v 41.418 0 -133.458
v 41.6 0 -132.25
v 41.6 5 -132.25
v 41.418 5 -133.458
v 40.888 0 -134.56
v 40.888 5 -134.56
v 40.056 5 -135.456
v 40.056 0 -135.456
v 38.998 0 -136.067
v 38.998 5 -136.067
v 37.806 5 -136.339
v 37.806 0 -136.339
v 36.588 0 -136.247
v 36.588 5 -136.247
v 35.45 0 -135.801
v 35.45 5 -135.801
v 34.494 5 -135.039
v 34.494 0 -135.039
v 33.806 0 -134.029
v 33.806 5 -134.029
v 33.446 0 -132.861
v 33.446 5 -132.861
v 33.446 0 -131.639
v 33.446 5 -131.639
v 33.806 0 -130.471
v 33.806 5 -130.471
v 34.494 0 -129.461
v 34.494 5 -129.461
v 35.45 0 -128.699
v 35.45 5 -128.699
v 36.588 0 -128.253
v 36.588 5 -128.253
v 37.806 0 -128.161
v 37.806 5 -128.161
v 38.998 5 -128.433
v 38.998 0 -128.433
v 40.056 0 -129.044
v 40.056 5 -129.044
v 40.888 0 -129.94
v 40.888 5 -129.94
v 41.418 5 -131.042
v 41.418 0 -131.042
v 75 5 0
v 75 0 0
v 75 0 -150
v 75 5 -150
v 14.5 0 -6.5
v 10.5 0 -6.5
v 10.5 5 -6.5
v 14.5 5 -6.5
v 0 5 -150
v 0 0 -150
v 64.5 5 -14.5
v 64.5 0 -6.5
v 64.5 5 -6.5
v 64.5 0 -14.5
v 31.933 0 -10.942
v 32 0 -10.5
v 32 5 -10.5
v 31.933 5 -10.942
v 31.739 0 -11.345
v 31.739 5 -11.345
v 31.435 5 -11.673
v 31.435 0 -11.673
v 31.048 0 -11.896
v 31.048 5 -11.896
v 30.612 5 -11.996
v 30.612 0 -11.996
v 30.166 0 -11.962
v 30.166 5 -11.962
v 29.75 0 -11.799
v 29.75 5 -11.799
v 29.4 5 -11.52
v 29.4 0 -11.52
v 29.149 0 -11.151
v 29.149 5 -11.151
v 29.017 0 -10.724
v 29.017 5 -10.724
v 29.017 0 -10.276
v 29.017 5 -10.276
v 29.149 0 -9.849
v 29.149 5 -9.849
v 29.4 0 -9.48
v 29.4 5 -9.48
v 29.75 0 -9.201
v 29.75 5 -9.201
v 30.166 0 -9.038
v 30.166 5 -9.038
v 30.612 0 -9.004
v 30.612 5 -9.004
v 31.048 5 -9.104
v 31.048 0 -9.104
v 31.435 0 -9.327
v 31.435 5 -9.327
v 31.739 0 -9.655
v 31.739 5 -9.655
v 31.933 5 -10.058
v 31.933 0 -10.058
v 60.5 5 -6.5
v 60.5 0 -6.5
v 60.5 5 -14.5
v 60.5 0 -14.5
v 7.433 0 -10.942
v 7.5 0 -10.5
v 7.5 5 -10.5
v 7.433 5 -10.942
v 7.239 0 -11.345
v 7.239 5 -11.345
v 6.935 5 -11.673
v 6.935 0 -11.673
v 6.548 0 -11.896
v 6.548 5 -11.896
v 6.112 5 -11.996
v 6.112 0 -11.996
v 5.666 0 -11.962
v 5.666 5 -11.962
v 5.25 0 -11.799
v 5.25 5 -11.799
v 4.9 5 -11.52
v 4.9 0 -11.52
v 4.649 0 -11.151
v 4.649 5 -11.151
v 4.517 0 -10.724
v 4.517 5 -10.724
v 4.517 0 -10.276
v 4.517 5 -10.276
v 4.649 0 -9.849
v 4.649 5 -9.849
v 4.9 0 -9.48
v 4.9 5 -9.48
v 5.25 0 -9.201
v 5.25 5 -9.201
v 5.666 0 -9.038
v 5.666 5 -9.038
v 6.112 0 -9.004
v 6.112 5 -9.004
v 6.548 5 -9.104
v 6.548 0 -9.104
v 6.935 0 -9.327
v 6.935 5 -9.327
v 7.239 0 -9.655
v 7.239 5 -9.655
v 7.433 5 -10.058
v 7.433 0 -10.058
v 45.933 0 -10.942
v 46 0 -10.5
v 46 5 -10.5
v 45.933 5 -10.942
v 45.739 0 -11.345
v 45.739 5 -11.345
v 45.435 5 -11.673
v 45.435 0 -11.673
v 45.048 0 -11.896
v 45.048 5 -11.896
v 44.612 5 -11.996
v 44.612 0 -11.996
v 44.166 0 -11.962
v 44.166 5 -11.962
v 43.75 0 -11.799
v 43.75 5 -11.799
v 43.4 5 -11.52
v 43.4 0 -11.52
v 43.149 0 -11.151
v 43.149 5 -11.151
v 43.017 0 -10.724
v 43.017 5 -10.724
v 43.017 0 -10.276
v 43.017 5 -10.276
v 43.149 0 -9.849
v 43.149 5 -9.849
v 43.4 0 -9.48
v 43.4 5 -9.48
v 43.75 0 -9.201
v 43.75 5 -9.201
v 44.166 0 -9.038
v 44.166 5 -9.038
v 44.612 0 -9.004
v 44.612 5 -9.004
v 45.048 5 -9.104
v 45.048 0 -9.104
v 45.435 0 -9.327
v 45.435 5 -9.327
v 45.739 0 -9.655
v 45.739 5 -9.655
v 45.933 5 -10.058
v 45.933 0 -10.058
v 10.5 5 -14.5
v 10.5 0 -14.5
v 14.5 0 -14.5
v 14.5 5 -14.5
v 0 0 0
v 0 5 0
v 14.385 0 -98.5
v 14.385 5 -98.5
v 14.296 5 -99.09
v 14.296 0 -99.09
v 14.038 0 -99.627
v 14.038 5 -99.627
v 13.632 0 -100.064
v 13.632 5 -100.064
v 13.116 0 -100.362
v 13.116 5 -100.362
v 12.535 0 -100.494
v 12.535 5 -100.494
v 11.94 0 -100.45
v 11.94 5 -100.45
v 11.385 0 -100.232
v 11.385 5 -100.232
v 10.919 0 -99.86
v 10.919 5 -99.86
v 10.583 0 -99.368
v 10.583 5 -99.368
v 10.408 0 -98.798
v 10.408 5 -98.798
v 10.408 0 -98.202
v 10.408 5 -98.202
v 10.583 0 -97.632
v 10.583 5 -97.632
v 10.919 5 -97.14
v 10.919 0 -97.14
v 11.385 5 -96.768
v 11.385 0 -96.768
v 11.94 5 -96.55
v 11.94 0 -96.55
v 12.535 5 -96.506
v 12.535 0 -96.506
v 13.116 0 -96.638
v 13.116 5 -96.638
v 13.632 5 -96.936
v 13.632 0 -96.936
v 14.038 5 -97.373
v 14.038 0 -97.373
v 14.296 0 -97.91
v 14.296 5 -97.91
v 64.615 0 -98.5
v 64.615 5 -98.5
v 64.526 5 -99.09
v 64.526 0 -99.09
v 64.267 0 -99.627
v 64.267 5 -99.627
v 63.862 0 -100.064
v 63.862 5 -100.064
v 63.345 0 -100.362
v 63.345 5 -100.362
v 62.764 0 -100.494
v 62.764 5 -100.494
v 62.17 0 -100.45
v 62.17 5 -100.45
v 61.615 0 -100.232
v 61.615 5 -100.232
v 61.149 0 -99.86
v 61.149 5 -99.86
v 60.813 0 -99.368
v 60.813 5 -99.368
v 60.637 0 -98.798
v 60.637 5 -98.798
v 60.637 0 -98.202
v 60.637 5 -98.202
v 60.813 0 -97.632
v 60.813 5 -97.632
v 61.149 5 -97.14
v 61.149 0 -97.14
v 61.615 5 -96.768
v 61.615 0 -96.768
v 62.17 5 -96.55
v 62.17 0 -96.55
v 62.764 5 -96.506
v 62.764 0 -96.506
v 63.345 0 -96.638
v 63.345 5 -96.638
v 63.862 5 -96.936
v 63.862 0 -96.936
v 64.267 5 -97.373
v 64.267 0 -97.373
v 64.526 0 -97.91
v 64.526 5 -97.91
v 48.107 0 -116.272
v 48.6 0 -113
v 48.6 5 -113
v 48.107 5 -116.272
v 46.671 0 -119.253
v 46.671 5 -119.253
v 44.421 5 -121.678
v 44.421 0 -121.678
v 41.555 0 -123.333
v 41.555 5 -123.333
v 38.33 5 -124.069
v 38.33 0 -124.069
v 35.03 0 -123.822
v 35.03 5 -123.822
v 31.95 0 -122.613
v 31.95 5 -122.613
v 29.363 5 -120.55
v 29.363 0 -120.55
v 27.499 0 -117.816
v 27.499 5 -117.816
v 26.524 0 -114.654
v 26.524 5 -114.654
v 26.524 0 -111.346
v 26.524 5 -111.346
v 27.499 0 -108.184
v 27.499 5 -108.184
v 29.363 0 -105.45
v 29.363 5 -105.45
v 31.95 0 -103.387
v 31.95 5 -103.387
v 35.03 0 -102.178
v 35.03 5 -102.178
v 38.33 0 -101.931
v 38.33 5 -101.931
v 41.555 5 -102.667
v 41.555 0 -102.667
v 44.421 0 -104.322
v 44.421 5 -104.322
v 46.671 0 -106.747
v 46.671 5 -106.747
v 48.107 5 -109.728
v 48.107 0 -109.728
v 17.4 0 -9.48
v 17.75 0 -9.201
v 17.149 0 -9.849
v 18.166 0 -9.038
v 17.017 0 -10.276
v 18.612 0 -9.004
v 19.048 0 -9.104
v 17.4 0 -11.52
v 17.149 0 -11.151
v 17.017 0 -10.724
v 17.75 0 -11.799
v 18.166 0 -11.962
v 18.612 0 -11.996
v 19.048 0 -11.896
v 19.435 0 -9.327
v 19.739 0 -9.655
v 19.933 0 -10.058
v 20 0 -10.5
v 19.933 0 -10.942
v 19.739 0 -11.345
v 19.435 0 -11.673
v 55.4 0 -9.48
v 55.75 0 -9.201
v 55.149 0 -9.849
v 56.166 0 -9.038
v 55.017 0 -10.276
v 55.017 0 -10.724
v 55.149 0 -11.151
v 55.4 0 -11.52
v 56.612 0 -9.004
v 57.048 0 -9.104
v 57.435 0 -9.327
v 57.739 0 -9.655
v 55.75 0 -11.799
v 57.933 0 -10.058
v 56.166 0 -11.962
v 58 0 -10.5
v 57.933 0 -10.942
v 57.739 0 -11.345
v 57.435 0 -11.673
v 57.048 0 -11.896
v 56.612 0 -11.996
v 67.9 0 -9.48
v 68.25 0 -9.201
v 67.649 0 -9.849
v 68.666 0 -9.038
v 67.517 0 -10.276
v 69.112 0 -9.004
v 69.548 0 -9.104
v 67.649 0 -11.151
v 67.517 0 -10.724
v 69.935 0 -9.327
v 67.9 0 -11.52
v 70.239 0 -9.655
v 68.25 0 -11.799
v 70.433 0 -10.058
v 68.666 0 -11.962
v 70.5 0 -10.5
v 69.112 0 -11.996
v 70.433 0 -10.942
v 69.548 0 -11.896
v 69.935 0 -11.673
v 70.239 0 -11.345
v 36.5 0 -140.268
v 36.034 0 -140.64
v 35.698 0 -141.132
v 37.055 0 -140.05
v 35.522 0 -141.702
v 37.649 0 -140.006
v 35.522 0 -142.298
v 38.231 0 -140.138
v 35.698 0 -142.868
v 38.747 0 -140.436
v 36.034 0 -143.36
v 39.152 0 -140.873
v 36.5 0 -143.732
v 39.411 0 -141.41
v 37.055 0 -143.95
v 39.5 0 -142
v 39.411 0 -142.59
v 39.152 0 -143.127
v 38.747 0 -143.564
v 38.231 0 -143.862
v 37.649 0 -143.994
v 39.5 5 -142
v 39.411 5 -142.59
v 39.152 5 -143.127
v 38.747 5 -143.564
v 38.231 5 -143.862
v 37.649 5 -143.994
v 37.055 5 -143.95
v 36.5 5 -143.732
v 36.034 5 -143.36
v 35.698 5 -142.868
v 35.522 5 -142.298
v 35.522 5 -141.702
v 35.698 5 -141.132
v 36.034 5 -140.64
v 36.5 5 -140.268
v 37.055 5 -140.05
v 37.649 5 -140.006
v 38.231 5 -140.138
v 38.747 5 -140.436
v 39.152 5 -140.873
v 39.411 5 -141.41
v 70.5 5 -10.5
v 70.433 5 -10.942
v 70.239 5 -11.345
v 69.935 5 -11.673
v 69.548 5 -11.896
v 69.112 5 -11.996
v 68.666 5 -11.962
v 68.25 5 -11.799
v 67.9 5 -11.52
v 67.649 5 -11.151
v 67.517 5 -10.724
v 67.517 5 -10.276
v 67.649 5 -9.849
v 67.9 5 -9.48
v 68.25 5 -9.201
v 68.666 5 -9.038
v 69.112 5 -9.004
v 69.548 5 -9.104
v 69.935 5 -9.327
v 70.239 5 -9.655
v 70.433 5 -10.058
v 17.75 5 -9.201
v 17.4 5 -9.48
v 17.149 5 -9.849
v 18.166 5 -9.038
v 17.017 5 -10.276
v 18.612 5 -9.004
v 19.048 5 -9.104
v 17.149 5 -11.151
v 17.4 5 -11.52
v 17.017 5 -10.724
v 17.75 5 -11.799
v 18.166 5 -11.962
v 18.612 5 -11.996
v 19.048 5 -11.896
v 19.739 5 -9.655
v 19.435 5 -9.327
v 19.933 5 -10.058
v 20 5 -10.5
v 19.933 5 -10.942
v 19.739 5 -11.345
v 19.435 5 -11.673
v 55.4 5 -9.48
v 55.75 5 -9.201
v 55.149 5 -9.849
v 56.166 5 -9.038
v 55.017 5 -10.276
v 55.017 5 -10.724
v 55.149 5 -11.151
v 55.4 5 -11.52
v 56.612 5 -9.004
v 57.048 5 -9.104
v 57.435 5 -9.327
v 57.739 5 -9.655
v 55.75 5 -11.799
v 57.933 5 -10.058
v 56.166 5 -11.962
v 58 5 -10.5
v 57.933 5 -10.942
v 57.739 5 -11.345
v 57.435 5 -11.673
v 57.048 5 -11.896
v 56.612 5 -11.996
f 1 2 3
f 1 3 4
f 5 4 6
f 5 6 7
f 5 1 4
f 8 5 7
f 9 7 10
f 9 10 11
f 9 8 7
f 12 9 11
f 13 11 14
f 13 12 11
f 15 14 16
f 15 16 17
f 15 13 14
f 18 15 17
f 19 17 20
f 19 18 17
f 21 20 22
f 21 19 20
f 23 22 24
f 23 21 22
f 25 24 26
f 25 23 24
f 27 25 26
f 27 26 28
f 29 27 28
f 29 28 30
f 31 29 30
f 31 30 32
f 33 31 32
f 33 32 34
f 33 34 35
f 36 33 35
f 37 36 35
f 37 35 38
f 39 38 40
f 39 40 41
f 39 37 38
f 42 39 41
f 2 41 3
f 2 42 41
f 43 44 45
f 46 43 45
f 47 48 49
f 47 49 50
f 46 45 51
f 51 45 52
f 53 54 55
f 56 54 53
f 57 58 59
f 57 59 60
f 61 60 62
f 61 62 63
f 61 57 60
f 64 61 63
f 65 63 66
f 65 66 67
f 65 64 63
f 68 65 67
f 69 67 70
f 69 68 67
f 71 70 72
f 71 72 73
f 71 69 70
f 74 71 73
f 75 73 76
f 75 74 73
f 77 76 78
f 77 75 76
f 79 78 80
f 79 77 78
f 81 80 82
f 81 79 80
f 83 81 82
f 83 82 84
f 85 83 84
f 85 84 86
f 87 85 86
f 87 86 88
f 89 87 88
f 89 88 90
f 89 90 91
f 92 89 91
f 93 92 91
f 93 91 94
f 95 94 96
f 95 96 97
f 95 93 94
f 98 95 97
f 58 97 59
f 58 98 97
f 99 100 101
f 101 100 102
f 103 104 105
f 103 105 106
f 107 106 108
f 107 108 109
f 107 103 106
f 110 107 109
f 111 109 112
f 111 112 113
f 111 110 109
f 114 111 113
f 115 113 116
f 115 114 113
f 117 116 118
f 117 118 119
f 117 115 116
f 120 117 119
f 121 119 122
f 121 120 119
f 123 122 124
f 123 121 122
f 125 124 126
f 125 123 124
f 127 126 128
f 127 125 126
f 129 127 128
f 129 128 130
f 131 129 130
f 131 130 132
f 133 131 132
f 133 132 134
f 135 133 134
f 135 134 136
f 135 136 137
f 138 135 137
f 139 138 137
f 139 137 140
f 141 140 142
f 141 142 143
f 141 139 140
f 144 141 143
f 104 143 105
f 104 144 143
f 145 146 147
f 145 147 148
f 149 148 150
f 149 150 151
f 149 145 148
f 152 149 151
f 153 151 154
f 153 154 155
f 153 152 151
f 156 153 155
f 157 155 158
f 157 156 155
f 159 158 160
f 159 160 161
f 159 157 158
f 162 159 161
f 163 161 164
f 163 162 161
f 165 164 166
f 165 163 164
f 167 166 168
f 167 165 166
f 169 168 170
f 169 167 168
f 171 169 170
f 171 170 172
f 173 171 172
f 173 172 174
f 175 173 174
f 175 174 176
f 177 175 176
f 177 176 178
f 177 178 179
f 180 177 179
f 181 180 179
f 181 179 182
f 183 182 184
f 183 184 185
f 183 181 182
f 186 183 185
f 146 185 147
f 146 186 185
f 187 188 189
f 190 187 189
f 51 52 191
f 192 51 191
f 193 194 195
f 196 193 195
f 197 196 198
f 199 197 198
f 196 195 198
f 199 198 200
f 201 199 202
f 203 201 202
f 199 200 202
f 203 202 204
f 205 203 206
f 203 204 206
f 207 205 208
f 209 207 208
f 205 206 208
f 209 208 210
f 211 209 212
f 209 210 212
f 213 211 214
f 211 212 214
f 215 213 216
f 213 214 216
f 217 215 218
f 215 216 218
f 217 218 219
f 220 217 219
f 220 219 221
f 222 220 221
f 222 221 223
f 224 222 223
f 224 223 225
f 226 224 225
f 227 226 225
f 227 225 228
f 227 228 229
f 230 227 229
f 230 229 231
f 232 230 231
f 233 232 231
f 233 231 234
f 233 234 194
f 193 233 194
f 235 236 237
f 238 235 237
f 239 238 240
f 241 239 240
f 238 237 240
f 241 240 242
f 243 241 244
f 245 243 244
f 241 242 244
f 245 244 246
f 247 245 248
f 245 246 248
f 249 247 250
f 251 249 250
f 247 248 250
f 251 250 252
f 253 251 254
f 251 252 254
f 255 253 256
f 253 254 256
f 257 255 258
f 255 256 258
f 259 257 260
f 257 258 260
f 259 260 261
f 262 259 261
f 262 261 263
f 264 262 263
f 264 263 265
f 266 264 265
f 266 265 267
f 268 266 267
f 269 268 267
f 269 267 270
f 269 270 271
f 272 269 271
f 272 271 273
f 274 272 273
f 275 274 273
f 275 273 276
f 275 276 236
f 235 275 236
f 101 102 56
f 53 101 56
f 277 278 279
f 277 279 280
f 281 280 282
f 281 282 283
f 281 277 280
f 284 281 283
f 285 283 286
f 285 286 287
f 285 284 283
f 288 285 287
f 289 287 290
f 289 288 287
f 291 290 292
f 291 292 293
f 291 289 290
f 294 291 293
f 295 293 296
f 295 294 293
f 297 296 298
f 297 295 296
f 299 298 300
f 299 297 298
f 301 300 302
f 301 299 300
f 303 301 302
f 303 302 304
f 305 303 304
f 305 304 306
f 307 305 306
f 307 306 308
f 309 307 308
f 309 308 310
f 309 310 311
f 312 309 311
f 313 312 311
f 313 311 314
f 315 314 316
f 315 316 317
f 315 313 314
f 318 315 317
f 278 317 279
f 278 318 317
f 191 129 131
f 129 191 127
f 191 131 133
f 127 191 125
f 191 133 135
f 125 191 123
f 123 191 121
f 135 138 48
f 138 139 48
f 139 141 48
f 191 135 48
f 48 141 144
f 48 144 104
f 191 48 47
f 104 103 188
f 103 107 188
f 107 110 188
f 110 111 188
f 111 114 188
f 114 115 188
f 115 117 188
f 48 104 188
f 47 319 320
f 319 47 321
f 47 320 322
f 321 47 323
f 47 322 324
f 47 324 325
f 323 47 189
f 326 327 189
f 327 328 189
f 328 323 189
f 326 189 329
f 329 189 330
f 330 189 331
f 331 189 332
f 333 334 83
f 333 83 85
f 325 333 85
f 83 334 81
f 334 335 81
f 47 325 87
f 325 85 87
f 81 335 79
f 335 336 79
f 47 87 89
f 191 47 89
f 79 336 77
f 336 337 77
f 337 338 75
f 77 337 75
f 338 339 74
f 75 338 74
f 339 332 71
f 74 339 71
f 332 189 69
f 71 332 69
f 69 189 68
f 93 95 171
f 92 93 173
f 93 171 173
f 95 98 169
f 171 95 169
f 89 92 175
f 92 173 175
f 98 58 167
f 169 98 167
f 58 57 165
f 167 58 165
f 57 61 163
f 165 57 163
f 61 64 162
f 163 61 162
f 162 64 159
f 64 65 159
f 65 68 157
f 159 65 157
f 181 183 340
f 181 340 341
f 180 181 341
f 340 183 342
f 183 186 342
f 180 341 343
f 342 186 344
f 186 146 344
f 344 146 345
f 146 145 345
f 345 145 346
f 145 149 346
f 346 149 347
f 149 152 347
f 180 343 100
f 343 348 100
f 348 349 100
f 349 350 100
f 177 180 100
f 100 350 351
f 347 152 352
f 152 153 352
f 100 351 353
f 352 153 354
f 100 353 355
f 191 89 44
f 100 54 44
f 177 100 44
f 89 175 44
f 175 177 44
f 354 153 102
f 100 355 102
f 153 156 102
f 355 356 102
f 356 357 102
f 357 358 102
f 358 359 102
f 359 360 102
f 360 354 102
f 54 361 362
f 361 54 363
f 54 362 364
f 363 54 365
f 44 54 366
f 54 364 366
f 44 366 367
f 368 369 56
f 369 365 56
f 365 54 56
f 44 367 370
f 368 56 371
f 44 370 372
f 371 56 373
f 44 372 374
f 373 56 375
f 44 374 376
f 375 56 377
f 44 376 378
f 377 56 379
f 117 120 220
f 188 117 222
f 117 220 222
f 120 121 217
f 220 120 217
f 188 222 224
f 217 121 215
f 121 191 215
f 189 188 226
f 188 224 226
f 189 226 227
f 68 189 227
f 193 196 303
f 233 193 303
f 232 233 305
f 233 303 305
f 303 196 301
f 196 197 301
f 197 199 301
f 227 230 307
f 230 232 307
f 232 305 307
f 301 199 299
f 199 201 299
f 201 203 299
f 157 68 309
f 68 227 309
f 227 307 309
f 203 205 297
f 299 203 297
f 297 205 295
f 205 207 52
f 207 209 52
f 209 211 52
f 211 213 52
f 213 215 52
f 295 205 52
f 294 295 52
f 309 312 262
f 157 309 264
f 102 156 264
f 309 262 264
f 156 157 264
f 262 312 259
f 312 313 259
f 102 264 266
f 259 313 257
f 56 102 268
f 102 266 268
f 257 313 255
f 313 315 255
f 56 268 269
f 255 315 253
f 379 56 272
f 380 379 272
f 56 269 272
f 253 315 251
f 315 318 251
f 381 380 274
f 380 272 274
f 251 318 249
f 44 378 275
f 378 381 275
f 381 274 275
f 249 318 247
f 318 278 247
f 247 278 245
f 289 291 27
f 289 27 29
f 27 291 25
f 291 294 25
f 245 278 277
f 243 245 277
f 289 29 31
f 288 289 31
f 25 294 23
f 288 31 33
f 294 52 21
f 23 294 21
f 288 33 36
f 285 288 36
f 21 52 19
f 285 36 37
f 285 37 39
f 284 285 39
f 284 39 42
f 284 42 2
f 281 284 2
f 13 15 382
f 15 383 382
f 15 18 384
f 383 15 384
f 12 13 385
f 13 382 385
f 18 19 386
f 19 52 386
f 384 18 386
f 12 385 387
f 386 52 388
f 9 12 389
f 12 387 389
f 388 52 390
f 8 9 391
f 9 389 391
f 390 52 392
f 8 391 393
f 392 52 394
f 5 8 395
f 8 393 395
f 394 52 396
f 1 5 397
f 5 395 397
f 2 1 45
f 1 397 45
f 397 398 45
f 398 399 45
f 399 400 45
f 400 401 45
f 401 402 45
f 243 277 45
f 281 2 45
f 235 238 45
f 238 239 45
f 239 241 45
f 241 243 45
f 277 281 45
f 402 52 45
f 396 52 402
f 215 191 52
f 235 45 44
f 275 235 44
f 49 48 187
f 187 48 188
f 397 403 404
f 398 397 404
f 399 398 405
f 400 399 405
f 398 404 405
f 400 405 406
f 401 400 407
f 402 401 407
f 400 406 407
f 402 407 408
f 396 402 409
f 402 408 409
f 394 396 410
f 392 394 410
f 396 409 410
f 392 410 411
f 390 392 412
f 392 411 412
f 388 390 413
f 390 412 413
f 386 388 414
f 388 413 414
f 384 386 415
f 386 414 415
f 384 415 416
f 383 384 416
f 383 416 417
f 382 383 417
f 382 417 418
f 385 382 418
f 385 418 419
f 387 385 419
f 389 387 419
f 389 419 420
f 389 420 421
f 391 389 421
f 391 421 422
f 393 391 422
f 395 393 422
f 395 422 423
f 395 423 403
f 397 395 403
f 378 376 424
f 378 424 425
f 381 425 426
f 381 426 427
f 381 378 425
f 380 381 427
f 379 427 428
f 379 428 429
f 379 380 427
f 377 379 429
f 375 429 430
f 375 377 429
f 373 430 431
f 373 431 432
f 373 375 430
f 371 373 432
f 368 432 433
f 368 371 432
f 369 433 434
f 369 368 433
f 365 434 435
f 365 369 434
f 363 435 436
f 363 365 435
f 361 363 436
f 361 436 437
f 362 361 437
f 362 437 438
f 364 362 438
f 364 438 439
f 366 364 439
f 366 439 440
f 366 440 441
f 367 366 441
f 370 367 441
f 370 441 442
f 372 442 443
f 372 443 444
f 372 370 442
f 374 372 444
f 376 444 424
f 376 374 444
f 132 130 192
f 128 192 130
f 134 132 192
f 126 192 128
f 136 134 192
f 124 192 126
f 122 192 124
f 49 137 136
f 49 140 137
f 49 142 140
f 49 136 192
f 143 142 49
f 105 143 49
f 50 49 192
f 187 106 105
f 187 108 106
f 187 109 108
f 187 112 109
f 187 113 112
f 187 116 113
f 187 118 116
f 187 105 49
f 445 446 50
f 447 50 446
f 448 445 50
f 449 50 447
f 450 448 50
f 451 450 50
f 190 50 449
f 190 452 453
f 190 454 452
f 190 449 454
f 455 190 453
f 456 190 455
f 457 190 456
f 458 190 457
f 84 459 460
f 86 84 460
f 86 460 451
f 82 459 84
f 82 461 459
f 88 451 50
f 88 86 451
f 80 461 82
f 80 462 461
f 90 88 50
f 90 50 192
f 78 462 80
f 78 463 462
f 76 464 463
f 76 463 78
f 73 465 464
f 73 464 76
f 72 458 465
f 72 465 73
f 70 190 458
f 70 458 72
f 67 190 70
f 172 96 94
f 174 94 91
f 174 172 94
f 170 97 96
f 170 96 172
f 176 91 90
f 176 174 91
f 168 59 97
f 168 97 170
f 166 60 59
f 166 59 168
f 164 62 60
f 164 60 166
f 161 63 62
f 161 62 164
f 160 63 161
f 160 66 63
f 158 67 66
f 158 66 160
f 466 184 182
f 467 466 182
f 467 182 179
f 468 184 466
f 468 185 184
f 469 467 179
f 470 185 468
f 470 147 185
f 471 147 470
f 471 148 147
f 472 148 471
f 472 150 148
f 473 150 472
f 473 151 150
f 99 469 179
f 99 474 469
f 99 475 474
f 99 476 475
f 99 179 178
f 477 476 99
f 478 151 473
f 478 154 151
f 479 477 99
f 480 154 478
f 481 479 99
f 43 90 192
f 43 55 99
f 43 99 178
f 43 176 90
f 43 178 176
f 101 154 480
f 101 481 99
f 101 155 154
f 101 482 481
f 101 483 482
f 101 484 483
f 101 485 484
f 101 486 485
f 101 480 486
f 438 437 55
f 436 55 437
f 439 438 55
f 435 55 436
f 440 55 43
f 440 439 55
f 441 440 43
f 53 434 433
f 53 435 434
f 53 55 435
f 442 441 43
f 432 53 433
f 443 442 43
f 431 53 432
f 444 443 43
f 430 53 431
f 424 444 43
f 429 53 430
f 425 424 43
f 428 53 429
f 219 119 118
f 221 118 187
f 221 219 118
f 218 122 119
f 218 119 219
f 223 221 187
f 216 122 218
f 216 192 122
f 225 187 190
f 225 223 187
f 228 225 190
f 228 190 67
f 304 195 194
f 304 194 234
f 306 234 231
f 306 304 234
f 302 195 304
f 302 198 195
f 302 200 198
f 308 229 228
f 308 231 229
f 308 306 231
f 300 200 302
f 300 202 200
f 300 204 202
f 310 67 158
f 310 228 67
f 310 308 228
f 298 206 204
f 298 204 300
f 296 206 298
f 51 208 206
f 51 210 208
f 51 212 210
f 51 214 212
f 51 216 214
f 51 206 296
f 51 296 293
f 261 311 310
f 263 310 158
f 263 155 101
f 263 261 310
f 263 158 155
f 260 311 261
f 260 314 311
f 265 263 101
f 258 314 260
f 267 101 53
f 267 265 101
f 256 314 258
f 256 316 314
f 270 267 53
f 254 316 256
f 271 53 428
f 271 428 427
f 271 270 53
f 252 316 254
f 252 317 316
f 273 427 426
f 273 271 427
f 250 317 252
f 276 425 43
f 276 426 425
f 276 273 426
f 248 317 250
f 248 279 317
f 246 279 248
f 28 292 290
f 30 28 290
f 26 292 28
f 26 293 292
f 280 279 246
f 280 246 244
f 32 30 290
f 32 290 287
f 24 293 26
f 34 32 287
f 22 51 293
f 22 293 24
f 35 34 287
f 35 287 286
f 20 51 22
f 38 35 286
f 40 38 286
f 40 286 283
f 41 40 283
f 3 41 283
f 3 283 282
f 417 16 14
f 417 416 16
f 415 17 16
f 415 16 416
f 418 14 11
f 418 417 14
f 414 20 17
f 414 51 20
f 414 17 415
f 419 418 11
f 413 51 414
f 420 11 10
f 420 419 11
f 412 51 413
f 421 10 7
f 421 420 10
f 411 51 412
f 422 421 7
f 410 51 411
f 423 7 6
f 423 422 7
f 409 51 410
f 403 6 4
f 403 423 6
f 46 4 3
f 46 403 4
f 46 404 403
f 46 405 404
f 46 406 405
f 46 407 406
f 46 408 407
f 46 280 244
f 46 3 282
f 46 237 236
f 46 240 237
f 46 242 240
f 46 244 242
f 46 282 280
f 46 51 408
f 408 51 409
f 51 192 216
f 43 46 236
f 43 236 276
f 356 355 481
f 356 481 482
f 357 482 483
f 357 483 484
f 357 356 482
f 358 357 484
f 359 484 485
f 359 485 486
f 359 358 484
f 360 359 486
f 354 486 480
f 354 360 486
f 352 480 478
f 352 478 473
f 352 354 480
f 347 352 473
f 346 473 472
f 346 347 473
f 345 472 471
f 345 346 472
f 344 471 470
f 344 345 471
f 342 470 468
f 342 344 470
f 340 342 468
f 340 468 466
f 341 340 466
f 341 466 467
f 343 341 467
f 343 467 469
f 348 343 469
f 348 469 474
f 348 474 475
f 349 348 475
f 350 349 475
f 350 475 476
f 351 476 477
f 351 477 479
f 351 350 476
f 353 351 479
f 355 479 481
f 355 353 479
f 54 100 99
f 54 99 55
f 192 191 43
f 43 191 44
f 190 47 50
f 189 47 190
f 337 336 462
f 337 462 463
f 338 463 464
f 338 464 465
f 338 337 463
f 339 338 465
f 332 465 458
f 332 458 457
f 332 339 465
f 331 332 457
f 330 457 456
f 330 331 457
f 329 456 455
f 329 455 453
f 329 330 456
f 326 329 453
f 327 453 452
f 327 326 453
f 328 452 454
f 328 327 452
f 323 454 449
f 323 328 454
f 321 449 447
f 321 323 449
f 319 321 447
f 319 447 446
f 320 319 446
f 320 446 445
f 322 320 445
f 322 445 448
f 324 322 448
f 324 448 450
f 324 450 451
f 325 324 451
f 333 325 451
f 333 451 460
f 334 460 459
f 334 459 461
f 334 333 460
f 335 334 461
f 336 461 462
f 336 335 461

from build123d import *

# Parameters (mm, degrees)
SKETCH_1_R          = 1.5
SKETCH_1_W          = 4
SKETCH_1_H          = 8
SKETCH_1_R_2        = 4.1
SKETCH_1_R_3        = 11.1
EXTRUDE_6_DEPTH     = 5
SKETCH_2_R          = 2
CUT_EXTRUDE_1_DEPTH = 10


with BuildPart() as part:
    # 草图1 → 凸台-拉伸6 (new body)
    with BuildSketch(Plane(origin=(0, 0, 0), x_dir=(1, 0, 0), z_dir=(0, 1, 0))):
        Polygon((75, 150), (37.5, 150), (0, 150), (0, 0), (75, 0), align=None)
        with Locations((6, 10.5)):
            Circle(SKETCH_1_R, mode=Mode.SUBTRACT)
        with Locations((12.5, 10.5)):
            Rectangle(SKETCH_1_W, SKETCH_1_H, mode=Mode.SUBTRACT)
        with Locations((18.5, 10.5)):
            Circle(SKETCH_1_R, mode=Mode.SUBTRACT)
        with Locations((30.5, 10.5)):
            Circle(SKETCH_1_R, mode=Mode.SUBTRACT)
        with Locations((44.5, 10.5)):
            Circle(SKETCH_1_R, mode=Mode.SUBTRACT)
        with Locations((56.5, 10.5)):
            Circle(SKETCH_1_R, mode=Mode.SUBTRACT)
        with Locations((62.5, 10.5)):
            Rectangle(SKETCH_1_W, SKETCH_1_H, mode=Mode.SUBTRACT)
        with Locations((69, 10.5)):
            Circle(SKETCH_1_R, mode=Mode.SUBTRACT)
        with Locations((37.5, 132.25)):
            Circle(SKETCH_1_R_2, mode=Mode.SUBTRACT)
        with Locations((37.5, 113)):
            Circle(SKETCH_1_R_3, mode=Mode.SUBTRACT)
    extrude(amount=EXTRUDE_6_DEPTH)

    # 草图2 → 切除-拉伸1 (cut)
    with BuildSketch(Plane(origin=(0, 5, 0), x_dir=(1, 0, 0), z_dir=(0, 1, 0))):
        with Locations((37.5, 142)):
            Circle(SKETCH_2_R)
        with Locations((62.61473671, 98.5)):
            Circle(SKETCH_2_R)
        with Locations((12.38526329, 98.5)):
            Circle(SKETCH_2_R)
    extrude(amount=-CUT_EXTRUDE_1_DEPTH, mode=Mode.SUBTRACT)


solid = part.part
